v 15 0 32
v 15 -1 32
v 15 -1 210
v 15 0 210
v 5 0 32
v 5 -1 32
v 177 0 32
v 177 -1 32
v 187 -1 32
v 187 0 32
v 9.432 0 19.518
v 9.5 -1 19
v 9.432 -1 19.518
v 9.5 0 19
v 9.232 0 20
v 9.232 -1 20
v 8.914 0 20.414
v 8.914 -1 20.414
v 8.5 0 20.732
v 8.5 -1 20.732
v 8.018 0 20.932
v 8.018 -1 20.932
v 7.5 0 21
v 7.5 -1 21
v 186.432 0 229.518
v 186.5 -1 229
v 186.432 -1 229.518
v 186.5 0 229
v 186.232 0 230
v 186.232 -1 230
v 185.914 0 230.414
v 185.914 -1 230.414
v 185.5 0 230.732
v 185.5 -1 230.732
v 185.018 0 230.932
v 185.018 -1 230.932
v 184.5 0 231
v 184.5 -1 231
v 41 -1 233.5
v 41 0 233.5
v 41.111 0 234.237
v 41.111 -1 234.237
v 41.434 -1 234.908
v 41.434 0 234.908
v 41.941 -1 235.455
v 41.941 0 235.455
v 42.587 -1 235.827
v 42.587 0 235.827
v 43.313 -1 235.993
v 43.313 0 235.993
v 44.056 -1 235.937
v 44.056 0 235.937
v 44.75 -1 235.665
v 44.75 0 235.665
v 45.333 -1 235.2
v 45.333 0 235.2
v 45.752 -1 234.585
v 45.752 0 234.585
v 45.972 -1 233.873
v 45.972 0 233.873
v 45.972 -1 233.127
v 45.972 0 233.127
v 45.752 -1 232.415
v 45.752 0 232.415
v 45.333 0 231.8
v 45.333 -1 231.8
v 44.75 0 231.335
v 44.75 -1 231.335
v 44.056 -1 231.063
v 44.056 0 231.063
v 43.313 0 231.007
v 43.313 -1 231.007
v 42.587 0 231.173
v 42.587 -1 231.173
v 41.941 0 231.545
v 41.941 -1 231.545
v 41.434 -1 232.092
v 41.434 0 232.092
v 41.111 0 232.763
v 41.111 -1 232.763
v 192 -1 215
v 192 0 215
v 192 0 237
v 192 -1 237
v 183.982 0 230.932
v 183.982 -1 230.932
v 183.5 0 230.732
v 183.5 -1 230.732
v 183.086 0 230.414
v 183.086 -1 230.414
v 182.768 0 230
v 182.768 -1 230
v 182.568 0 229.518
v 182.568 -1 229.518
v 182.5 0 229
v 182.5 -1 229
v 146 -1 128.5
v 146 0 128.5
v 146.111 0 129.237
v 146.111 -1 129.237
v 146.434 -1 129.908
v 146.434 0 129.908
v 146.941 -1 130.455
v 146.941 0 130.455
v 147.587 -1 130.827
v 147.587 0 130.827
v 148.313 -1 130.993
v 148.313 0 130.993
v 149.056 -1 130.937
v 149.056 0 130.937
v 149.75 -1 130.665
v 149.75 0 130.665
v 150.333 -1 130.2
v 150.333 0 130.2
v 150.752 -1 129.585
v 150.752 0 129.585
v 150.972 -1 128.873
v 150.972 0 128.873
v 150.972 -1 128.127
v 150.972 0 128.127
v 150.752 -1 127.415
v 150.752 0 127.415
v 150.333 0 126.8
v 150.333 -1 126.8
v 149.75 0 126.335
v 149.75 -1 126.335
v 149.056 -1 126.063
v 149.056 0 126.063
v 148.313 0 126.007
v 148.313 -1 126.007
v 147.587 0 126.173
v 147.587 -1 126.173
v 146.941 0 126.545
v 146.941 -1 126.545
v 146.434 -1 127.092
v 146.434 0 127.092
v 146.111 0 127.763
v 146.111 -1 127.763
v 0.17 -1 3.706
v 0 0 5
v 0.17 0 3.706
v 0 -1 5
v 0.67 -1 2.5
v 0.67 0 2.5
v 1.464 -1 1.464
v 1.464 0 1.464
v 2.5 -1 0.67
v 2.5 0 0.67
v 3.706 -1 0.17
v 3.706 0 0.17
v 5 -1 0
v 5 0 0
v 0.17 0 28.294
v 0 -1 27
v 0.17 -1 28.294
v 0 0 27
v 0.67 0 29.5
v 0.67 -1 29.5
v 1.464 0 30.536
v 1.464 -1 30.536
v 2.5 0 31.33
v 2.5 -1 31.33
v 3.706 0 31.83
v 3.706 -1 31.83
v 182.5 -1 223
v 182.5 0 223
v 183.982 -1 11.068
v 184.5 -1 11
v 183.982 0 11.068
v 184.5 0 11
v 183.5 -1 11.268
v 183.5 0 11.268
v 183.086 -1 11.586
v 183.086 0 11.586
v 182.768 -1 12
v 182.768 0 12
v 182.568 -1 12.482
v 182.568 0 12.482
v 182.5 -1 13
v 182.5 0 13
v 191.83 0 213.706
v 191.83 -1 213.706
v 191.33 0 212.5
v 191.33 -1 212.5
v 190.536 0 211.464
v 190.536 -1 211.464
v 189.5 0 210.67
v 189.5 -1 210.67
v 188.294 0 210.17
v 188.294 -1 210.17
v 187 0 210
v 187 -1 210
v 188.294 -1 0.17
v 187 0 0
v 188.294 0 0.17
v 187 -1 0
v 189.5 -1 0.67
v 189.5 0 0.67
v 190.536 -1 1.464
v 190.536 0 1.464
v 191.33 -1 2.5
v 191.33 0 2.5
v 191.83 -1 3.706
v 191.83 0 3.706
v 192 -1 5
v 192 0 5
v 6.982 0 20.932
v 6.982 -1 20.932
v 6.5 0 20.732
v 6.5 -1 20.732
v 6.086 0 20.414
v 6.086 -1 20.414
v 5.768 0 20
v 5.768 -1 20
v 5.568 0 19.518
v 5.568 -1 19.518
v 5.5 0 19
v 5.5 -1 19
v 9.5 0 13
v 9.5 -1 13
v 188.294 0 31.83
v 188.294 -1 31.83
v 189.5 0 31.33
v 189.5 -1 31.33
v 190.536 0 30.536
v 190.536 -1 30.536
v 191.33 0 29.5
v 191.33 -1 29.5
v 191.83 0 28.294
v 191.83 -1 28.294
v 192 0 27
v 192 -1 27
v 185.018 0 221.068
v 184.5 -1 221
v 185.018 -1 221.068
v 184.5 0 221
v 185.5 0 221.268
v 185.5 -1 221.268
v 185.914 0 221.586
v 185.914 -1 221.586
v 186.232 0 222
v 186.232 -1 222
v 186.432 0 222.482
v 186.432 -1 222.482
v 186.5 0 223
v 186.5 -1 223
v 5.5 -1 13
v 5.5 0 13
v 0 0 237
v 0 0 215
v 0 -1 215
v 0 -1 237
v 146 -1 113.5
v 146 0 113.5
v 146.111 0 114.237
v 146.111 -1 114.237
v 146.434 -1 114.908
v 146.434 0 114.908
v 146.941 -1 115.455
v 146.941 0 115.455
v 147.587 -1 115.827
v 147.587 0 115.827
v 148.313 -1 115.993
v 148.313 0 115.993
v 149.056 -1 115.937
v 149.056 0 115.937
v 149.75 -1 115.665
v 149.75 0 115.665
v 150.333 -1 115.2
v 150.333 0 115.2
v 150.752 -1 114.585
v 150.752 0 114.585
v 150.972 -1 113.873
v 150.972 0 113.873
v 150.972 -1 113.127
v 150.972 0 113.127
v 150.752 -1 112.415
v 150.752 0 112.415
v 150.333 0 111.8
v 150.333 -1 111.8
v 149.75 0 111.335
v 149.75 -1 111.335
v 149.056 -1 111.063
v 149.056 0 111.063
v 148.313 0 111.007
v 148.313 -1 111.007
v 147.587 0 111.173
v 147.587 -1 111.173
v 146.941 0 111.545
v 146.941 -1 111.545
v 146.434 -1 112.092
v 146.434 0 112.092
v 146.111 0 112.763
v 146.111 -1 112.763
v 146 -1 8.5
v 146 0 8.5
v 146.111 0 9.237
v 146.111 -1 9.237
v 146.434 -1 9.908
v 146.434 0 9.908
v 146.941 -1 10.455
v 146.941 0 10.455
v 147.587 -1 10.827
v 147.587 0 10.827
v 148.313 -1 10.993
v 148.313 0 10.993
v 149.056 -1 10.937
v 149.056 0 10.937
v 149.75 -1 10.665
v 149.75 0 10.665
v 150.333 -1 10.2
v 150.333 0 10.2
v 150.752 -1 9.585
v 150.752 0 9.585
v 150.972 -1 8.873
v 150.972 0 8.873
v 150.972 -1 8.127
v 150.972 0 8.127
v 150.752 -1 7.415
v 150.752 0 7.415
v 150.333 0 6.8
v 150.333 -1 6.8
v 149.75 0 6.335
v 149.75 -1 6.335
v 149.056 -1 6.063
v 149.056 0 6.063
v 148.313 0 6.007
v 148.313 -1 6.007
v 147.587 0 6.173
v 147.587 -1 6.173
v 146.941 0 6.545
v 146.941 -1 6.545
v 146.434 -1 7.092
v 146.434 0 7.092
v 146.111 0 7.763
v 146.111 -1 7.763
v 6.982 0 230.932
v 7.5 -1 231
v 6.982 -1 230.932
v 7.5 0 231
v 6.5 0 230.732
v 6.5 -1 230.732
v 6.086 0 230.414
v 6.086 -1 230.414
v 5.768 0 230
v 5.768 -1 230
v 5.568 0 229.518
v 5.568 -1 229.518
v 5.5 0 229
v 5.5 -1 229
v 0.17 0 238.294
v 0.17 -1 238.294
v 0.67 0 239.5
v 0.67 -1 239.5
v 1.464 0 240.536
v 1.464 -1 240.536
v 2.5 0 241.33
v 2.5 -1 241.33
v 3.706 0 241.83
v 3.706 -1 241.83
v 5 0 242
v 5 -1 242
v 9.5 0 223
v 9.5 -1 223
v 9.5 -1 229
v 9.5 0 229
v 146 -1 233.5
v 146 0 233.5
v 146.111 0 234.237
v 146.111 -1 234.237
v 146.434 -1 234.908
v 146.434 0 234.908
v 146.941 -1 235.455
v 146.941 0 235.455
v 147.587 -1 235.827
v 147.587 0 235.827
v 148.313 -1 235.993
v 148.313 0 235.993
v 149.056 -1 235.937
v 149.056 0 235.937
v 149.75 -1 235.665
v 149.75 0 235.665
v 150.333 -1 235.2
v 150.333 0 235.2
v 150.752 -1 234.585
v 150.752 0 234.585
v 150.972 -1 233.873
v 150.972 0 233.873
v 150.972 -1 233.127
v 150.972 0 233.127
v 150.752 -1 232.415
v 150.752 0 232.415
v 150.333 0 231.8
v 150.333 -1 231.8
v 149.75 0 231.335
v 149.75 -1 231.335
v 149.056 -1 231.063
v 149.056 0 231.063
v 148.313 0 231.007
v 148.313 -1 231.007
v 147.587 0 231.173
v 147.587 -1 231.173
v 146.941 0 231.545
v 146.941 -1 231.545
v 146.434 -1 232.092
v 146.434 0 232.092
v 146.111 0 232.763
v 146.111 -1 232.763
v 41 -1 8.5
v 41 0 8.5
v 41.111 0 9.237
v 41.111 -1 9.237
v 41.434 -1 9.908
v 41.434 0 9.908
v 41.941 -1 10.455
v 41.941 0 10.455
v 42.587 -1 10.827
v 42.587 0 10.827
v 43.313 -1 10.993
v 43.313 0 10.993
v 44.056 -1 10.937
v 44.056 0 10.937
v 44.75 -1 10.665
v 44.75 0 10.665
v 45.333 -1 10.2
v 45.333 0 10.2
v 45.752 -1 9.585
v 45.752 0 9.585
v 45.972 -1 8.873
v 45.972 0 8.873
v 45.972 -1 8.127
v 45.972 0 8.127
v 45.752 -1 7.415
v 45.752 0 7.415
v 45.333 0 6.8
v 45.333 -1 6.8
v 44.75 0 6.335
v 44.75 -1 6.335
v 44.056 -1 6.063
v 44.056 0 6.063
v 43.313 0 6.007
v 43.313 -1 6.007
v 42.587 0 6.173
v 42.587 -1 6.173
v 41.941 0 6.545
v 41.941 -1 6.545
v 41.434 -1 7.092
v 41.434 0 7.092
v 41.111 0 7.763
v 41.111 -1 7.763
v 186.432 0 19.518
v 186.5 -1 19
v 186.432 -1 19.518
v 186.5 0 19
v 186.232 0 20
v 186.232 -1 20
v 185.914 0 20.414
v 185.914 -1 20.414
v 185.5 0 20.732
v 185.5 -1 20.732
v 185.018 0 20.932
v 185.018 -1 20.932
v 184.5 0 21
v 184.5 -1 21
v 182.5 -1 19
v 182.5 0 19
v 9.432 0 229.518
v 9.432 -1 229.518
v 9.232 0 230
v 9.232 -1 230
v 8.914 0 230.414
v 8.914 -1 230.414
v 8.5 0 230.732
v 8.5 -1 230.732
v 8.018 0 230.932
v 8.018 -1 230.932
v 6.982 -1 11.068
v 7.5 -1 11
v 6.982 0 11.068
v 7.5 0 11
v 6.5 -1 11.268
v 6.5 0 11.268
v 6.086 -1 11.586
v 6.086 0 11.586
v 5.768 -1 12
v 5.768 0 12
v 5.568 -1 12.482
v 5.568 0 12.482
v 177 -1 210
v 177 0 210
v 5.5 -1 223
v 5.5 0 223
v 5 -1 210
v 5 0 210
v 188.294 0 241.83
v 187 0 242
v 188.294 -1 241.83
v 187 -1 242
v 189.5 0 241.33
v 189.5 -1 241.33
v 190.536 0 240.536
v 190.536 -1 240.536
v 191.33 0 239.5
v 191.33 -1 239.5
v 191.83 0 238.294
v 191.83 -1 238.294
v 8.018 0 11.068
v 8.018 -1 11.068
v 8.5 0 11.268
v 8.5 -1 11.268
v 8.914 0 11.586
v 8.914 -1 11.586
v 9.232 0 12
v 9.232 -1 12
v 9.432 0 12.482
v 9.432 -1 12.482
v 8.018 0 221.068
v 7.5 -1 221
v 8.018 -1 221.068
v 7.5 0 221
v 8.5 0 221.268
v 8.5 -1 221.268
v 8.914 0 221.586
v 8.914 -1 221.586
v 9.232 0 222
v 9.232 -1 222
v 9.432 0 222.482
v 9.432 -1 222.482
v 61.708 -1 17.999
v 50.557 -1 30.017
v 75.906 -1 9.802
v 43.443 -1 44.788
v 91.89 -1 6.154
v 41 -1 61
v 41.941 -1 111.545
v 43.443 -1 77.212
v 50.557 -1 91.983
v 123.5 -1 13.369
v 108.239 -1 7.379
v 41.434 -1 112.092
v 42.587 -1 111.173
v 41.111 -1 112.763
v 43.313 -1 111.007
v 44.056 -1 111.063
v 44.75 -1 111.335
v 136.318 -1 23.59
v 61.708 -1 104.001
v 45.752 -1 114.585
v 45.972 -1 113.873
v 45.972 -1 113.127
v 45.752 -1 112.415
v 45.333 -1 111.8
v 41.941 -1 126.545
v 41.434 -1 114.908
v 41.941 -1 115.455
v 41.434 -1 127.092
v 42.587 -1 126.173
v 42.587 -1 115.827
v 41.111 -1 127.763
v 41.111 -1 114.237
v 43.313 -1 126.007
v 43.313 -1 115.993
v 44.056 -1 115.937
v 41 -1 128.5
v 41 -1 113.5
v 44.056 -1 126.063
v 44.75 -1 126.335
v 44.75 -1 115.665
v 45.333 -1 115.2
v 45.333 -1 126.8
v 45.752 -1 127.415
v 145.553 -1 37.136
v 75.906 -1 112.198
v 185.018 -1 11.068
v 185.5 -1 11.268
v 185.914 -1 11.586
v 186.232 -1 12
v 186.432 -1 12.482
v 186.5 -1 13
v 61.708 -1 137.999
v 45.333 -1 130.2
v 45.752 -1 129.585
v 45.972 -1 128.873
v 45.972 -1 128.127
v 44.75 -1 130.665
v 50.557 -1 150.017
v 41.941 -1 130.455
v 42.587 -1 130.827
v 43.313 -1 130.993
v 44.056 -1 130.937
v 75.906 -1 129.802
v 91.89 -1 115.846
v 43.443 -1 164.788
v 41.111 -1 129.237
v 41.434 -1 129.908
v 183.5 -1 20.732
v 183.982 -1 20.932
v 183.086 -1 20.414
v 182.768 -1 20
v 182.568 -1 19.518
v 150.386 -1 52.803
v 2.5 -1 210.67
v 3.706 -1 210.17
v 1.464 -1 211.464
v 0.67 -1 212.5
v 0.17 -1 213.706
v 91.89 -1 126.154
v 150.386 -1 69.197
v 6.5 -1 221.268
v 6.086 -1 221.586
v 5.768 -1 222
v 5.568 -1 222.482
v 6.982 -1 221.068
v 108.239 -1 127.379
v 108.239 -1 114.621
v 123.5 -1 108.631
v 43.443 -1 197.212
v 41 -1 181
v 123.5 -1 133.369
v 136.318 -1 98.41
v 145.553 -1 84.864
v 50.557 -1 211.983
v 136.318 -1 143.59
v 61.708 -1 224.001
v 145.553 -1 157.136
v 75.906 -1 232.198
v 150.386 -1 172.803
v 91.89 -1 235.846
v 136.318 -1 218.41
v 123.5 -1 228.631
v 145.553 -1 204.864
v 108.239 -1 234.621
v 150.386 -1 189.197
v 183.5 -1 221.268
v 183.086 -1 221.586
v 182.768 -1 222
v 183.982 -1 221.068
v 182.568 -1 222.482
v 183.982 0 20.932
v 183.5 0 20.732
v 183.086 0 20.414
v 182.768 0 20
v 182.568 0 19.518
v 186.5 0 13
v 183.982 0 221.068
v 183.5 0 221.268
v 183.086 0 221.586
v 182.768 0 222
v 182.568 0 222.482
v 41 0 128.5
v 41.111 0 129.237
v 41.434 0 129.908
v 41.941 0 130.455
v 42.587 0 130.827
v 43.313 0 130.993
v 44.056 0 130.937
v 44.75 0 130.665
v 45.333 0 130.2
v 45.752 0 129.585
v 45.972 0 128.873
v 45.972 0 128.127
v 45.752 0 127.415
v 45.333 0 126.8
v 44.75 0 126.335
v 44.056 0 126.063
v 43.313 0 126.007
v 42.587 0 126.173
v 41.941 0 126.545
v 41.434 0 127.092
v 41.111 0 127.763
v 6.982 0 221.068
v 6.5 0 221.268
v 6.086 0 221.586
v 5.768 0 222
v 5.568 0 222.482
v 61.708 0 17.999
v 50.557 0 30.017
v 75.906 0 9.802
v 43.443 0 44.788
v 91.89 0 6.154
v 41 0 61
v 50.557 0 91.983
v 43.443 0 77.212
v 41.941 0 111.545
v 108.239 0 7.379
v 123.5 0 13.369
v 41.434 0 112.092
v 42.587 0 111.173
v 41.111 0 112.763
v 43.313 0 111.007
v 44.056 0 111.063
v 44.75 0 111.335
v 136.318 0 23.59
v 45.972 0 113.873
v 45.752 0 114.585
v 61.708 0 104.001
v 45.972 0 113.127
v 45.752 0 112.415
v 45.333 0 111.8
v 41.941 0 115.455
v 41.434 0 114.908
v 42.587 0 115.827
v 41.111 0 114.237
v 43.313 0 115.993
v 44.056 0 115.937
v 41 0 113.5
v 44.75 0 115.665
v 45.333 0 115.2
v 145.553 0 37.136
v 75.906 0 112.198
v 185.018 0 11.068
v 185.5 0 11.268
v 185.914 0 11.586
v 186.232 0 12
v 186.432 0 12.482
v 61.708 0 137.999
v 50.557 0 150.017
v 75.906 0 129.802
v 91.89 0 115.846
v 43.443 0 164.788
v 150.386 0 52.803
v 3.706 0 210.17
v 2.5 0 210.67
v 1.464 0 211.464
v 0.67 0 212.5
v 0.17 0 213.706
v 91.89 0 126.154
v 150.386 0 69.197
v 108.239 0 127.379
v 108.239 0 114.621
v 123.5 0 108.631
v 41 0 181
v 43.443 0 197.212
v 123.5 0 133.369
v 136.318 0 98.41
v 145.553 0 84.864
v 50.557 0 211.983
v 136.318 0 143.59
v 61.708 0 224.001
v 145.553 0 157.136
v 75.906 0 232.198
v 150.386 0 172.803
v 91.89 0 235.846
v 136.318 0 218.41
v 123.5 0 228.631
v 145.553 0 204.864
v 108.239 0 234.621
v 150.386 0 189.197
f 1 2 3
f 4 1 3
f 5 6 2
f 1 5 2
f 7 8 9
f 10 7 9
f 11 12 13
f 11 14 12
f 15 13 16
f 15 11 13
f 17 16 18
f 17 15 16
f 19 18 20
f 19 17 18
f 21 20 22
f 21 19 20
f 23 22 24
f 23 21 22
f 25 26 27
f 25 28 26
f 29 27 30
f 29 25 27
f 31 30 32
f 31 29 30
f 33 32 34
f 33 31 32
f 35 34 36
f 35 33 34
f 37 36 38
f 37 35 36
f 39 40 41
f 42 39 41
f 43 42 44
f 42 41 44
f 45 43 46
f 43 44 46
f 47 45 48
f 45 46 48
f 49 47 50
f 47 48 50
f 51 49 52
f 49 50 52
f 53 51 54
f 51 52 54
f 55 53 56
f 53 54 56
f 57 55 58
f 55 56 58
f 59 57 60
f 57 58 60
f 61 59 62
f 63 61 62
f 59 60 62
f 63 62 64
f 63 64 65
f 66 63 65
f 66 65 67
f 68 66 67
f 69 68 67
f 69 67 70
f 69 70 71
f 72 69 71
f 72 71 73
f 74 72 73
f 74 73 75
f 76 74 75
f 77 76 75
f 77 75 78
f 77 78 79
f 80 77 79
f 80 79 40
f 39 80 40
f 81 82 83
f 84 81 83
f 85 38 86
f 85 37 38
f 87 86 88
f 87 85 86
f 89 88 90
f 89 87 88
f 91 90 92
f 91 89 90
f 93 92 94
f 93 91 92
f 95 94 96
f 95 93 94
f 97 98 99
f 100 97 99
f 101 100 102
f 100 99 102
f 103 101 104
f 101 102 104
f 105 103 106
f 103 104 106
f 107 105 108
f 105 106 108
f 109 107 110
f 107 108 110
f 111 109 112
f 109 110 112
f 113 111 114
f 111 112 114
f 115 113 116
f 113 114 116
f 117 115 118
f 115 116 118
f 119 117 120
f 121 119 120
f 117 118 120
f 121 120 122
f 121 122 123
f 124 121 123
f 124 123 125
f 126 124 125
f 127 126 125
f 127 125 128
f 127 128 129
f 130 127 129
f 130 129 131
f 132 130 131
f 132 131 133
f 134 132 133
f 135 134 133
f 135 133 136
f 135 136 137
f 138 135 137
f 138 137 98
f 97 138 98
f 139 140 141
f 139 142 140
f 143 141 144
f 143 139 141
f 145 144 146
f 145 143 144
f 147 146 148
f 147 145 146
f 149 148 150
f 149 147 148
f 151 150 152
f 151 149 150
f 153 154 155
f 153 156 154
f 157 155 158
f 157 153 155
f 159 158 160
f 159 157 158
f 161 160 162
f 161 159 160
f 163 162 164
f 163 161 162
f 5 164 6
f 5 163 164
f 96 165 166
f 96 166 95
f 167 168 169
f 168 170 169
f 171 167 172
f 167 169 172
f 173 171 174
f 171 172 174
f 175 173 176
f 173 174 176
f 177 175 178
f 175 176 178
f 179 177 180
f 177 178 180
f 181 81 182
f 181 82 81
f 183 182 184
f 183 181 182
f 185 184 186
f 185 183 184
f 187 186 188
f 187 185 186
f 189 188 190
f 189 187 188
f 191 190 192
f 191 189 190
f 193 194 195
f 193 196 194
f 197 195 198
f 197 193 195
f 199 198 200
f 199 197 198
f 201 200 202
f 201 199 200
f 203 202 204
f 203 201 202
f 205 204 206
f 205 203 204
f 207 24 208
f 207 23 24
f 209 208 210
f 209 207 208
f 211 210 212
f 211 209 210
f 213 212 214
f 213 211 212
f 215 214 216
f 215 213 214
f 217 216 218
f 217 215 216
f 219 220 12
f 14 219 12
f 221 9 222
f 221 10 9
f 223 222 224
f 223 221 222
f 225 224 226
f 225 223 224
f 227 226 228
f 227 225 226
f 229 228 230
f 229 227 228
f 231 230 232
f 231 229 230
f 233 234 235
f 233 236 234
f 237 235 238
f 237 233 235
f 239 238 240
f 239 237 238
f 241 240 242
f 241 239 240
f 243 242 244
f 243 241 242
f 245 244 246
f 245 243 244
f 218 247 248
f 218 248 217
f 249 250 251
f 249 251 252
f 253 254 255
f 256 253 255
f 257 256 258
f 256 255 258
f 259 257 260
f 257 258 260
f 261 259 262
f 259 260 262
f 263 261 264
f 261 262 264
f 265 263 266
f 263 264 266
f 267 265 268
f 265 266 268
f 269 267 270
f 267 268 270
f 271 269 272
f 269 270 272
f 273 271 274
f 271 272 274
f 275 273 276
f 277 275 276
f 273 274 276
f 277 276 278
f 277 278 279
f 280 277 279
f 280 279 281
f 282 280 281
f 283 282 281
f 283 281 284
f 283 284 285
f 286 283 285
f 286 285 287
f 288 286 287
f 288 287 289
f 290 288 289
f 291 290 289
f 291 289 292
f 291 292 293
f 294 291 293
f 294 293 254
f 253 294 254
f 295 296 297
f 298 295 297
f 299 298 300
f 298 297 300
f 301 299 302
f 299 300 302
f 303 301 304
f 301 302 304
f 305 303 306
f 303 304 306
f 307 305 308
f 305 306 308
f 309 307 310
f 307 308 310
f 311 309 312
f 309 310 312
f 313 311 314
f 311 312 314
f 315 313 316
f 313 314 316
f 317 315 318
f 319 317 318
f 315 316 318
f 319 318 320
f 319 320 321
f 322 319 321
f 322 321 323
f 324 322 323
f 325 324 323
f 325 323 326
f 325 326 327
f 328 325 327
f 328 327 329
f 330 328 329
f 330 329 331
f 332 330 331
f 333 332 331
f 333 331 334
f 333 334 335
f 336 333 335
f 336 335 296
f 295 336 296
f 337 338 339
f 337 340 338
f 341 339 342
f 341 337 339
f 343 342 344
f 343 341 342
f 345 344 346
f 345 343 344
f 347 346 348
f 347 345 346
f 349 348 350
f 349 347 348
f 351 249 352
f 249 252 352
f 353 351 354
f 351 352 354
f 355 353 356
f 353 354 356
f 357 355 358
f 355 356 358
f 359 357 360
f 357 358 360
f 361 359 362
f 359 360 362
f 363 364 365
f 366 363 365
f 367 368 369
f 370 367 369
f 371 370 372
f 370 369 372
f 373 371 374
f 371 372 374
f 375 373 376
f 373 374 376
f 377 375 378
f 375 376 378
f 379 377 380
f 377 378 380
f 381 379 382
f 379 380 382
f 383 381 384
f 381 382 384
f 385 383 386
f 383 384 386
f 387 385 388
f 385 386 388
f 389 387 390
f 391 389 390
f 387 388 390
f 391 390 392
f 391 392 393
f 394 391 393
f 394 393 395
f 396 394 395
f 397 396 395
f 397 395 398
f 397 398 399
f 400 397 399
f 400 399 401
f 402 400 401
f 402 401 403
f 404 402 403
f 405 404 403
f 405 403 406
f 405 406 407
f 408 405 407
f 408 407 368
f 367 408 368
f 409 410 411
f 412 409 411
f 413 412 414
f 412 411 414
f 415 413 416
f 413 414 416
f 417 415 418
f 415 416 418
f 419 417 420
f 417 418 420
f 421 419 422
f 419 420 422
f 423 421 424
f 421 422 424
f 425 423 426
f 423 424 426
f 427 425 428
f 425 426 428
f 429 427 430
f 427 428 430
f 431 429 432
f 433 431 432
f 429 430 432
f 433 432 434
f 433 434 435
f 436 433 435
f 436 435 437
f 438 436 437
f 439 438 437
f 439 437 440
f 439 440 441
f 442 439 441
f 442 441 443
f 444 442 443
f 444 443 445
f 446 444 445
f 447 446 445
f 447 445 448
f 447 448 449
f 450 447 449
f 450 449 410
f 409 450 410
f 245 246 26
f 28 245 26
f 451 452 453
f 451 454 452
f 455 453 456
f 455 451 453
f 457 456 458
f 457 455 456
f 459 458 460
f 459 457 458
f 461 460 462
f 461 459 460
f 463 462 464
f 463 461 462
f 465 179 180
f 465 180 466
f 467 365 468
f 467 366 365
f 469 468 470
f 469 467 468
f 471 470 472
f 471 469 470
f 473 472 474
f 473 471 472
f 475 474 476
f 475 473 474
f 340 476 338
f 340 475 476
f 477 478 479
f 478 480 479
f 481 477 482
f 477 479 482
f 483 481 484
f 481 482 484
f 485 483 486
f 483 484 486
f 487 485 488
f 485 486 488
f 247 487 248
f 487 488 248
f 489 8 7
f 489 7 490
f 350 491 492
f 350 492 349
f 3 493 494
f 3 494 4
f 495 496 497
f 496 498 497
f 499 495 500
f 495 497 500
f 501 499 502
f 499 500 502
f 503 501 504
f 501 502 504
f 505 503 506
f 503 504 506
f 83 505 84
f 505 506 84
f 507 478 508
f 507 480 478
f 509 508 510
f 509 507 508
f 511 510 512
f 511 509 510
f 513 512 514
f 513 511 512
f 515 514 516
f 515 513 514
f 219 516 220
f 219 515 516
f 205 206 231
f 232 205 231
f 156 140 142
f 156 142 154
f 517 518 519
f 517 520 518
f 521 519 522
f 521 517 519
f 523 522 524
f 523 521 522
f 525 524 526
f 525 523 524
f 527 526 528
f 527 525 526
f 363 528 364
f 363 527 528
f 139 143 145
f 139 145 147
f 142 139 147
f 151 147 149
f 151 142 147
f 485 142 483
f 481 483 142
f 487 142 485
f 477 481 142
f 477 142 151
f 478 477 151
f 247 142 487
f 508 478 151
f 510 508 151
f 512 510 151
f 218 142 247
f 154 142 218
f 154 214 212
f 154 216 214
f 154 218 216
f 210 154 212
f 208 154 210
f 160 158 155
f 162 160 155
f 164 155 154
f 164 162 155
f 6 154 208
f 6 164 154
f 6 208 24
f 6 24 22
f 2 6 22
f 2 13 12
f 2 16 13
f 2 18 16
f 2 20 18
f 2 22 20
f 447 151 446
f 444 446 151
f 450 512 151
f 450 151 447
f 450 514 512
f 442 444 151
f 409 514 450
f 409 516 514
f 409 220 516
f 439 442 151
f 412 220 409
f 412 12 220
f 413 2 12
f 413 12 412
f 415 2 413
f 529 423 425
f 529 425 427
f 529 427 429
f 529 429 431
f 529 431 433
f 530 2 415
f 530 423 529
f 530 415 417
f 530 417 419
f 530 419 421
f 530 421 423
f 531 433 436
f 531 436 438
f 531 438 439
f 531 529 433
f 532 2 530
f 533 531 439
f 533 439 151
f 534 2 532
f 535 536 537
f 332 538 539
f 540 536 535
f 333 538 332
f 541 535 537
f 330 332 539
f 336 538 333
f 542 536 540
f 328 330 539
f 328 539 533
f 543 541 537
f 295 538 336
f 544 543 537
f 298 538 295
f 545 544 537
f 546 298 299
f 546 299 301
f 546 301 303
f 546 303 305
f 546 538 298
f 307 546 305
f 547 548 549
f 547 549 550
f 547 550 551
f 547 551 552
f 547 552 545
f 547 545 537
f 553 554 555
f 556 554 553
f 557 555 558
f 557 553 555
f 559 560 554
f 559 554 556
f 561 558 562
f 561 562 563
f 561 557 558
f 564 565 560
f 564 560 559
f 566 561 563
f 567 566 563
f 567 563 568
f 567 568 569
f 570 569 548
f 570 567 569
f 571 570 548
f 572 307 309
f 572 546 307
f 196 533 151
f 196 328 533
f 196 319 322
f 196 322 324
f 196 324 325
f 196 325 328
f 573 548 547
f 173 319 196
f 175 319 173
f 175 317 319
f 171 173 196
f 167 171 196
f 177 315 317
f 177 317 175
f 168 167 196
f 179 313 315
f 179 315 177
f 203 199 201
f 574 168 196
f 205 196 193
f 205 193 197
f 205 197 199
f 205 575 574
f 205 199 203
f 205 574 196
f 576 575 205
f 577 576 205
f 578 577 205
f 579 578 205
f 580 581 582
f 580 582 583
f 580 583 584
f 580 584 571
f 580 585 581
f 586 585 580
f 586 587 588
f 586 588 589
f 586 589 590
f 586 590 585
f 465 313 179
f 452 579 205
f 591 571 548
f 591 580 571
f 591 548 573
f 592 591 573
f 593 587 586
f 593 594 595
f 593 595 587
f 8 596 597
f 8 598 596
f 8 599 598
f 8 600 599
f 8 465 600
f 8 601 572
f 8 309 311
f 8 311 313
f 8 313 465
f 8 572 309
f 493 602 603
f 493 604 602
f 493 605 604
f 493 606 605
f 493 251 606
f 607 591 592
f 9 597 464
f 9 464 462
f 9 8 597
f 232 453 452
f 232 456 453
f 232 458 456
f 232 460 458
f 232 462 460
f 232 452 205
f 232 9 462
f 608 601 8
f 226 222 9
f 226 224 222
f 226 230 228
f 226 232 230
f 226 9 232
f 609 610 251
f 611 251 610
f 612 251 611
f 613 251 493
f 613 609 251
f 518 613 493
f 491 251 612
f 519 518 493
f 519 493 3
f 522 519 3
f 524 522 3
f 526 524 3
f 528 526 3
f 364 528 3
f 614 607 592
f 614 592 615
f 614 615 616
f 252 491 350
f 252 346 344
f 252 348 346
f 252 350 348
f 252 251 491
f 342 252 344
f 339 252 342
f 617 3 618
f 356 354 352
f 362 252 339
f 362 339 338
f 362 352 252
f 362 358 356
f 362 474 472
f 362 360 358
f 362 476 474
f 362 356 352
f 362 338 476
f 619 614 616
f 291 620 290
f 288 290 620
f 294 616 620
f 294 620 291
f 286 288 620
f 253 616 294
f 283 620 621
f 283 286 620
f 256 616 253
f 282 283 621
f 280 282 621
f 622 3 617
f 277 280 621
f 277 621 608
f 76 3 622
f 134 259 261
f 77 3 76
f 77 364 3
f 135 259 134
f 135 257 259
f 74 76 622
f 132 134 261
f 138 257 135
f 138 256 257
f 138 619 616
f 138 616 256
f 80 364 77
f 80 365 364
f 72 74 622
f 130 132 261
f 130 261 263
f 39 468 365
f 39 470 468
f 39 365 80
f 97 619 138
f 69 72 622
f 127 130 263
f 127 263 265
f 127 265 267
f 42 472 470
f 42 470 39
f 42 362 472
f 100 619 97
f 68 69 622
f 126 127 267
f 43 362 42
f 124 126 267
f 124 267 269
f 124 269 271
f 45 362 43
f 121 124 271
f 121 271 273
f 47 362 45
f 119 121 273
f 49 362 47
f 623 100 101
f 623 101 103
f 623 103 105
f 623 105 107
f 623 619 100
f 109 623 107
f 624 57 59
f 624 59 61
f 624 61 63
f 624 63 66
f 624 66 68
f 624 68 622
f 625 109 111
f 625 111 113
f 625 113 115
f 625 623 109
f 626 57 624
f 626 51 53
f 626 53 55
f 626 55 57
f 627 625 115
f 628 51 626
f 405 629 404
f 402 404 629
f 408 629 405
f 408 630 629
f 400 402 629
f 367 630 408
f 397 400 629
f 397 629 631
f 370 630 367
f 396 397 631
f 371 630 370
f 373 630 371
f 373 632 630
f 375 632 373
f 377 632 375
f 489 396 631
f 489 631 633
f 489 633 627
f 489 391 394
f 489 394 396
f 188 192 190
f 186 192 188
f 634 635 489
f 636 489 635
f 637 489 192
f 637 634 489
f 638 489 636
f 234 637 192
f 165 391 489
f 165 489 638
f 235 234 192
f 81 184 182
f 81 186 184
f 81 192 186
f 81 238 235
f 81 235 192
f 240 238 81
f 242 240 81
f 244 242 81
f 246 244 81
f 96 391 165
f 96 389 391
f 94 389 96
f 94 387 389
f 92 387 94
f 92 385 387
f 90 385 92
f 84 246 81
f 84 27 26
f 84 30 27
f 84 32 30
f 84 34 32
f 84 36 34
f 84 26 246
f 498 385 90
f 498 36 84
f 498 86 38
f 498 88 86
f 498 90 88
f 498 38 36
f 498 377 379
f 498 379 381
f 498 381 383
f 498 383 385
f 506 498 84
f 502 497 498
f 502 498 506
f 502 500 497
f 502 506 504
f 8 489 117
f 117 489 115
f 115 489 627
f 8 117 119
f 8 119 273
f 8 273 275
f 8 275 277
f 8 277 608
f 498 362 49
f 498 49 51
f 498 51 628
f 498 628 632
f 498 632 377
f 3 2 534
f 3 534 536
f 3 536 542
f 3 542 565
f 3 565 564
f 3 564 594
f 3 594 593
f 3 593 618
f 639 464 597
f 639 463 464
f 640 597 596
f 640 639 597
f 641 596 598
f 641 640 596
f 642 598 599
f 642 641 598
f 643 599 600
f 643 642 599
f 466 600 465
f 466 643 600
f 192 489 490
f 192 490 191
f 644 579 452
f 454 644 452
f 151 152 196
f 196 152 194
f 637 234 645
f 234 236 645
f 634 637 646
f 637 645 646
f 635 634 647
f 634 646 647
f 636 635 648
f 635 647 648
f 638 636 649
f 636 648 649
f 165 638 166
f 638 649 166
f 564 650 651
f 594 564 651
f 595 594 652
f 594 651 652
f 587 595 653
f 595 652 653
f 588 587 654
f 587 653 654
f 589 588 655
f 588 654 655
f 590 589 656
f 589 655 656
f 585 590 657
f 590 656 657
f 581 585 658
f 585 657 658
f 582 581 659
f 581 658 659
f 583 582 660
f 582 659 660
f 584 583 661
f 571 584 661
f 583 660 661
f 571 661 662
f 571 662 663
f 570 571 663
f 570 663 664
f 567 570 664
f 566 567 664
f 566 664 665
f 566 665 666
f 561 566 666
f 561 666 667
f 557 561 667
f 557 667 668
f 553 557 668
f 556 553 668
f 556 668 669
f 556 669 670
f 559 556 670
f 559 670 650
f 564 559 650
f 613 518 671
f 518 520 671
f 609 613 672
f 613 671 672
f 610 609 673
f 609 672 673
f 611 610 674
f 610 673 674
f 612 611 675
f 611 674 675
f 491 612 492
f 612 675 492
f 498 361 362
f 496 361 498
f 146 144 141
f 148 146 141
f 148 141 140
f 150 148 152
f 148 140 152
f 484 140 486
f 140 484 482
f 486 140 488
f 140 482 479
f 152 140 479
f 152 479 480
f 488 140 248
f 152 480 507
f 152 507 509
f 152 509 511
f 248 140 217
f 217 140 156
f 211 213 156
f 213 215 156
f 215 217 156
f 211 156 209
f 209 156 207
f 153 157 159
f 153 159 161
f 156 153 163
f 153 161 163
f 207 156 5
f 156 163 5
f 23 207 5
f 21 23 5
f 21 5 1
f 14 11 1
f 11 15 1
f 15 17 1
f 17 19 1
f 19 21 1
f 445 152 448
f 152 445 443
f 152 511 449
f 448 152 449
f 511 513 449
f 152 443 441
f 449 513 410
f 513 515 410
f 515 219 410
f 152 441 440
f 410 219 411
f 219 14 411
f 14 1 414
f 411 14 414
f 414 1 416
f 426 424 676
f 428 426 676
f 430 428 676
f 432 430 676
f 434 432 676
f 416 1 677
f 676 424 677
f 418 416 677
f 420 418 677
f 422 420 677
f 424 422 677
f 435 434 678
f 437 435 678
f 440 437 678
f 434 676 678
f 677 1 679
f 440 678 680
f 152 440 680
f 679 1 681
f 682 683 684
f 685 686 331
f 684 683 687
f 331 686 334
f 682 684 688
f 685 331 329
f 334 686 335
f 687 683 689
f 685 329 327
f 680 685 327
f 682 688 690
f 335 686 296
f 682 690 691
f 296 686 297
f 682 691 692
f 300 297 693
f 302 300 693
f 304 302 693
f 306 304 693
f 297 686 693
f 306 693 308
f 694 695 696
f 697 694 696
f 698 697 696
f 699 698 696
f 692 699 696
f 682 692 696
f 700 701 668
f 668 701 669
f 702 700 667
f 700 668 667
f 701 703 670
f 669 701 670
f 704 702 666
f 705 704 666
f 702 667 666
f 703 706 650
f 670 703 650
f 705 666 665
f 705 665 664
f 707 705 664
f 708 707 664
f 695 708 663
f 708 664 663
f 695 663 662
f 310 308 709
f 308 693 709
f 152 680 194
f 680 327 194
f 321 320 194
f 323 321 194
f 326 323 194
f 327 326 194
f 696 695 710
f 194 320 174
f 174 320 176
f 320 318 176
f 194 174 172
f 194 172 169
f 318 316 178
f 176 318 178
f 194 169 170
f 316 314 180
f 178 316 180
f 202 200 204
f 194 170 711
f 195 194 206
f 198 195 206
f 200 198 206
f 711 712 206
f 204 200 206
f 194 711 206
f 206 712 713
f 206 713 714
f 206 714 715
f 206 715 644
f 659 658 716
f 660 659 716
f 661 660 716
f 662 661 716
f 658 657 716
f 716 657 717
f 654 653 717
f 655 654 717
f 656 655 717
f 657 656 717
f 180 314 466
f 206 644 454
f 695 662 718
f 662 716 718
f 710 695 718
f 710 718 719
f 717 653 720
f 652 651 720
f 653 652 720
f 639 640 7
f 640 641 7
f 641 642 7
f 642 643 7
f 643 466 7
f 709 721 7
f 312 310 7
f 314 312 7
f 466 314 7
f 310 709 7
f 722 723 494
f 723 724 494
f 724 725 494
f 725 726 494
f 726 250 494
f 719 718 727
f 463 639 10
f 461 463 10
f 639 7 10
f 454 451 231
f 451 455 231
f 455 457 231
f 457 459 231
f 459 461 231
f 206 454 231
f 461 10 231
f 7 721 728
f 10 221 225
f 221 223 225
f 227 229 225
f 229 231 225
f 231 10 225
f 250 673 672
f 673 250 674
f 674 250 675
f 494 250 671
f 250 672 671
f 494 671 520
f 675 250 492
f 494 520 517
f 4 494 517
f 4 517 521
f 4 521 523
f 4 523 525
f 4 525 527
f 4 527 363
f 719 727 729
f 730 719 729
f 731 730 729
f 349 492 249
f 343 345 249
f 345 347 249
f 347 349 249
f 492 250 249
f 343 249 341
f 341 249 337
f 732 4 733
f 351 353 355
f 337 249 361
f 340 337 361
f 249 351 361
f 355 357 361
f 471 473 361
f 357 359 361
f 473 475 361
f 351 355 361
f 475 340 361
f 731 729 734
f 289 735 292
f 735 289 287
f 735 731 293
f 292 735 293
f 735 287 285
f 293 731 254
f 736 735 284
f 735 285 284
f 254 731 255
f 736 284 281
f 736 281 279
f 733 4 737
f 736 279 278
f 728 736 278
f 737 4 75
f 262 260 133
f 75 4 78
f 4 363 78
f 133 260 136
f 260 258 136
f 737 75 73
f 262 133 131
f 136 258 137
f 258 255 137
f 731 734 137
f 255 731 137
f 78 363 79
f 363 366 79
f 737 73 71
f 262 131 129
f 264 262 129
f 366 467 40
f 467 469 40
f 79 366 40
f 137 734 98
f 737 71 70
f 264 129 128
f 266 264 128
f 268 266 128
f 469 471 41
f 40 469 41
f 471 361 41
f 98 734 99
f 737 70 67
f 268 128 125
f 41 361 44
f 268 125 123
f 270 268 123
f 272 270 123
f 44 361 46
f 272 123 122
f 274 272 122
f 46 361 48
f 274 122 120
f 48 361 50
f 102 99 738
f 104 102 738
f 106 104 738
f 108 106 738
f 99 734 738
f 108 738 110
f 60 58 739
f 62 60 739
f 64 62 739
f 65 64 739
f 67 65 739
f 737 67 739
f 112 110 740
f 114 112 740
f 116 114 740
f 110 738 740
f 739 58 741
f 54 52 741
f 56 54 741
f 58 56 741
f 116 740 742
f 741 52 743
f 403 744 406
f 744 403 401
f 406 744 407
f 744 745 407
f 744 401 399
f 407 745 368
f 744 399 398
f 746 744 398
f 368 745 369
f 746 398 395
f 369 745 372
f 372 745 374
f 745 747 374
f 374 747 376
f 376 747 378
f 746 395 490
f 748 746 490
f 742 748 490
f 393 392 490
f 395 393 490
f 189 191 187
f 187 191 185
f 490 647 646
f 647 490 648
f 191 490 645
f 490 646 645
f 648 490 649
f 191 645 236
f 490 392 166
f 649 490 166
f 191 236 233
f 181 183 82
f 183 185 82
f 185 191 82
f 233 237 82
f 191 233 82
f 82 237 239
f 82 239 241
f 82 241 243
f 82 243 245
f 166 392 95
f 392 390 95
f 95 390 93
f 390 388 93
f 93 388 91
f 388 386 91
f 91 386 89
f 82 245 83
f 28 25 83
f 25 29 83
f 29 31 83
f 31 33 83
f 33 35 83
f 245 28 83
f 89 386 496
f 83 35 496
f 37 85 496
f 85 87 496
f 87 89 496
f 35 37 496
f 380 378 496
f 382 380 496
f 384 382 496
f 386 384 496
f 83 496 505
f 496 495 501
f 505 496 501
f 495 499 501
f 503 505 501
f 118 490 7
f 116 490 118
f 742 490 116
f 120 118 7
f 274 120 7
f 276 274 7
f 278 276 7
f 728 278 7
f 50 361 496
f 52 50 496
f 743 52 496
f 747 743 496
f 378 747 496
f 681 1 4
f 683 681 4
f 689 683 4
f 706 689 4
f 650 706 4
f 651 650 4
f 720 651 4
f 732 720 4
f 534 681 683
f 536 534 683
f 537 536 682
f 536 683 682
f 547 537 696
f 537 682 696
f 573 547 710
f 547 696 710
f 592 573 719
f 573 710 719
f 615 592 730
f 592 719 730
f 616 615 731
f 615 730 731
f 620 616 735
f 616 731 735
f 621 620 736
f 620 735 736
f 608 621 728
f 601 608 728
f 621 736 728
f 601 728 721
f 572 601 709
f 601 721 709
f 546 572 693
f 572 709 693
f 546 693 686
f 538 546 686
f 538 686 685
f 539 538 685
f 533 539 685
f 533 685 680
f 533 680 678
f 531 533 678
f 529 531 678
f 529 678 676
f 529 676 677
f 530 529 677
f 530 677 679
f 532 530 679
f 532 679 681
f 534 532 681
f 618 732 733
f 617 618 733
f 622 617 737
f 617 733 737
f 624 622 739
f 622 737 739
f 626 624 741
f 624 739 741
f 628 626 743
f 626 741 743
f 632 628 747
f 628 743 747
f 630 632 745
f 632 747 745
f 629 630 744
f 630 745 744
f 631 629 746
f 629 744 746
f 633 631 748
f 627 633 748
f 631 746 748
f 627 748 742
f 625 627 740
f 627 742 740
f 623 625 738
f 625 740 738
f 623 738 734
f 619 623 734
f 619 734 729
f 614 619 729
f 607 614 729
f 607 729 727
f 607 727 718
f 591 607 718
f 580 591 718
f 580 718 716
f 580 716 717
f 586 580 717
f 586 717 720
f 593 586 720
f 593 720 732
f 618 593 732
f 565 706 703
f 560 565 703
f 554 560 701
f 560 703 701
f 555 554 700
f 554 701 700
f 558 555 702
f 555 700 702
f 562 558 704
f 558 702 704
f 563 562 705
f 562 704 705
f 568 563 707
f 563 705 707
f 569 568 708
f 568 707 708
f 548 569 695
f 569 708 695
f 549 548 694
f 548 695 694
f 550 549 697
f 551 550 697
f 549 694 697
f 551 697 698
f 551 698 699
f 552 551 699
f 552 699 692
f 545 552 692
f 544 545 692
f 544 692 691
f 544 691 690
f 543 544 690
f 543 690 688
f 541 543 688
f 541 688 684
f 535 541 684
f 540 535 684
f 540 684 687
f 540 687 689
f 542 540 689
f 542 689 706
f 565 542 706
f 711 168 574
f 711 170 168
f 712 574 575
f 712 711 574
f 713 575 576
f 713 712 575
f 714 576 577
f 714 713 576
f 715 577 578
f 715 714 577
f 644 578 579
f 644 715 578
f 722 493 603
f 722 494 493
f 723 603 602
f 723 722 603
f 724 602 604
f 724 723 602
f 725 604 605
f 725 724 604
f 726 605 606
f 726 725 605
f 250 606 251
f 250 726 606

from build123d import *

# Parameters (mm, degrees)
F0_W      = 192
F0_H      = 242
F1_DEPTH  = 1
F3_D      = 110
F5_D      = 5
F6_W      = 15
F6_H      = 178
F7_DEPTH  = 1
F8_R      = 5
F9_W      = 4
F9_H      = 10
F10_DEPTH = 1
F11_R     = 1.99999


# Not quite as in the source:
# - a fillet or chamfer is up to 0.001 mm smaller than in the source, because OpenCascade refuses the exact size


with BuildPart() as f1:
    # F0 (on Front) → F1 (new body)
    with BuildSketch(Plane.XZ):
        with Locations((96, 121)):
            Rectangle(F0_W, F0_H)
    extrude(amount=F1_DEPTH)

    # F3 (through all)
    with Locations(Plane.XZ.offset(1)):
        with Locations((96, 181), (96, 61)):
            Hole(F3_D / 2)

    # F5 (through all)
    with Locations(Plane.XZ.offset(1)):
        with Locations((43.5, 233.5), (148.5, 233.5), (43.5, 128.5), (148.5, 128.5), (43.5, 113.5), (148.5, 113.5), (43.5, 8.5), (148.5, 8.5)):
            Hole(F5_D / 2)

    # F6 (on face) → F7 (cut)
    with BuildSketch(Plane.XZ.offset(1)):
        with Locations((7.5, 121)):
            Rectangle(F6_W, F6_H)
        with Locations((184.5, 121)):
            Rectangle(F6_W, F6_H)
    extrude(amount=-F7_DEPTH, mode=Mode.SUBTRACT)

    # F8
    f8_edges = [f1.edges().sort_by_distance(p)[0] for p in [
        (0, -0.5, 210),
        (0, -0.5, 242),
        (0, -0.5, 32),
        (0, -0.5, 0),
        (192, -0.5, 32),
        (192, -0.5, 0),
        (192, -0.5, 242),
        (192, -0.5, 210),
    ]]
    fillet(f8_edges, radius=F8_R)

    # F9 (on face) → F10 (cut)
    with BuildSketch(Plane.XZ.offset(1)):
        with Locations((7.5, 226)):
            Rectangle(F9_W, F9_H)
        with Locations((184.5, 226)):
            Rectangle(F9_W, F9_H)
        with Locations((7.5, 16)):
            Rectangle(F9_W, F9_H)
        with Locations((184.5, 16)):
            Rectangle(F9_W, F9_H)
    extrude(amount=-F10_DEPTH, mode=Mode.SUBTRACT)

    # F11 (radius 2 in the source; OpenCascade refuses exactly that, so slightly less here)
    f11_edges = [f1.edges().sort_by_distance(p)[0] for p in [
        (9.5, -0.5, 231),
        (5.5, -0.5, 231),
        (5.5, -0.5, 221),
        (9.5, -0.5, 221),
        (182.5, -0.5, 231),
        (186.5, -0.5, 231),
        (182.5, -0.5, 221),
        (186.5, -0.5, 221),
        (182.5, -0.5, 21),
        (186.5, -0.5, 21),
        (186.5, -0.5, 11),
        (182.5, -0.5, 11),
        (5.5, -0.5, 21),
        (9.5, -0.5, 21),
        (9.5, -0.5, 11),
        (5.5, -0.5, 11),
    ]]
    fillet(f11_edges, radius=F11_R)


solid = f1.part
